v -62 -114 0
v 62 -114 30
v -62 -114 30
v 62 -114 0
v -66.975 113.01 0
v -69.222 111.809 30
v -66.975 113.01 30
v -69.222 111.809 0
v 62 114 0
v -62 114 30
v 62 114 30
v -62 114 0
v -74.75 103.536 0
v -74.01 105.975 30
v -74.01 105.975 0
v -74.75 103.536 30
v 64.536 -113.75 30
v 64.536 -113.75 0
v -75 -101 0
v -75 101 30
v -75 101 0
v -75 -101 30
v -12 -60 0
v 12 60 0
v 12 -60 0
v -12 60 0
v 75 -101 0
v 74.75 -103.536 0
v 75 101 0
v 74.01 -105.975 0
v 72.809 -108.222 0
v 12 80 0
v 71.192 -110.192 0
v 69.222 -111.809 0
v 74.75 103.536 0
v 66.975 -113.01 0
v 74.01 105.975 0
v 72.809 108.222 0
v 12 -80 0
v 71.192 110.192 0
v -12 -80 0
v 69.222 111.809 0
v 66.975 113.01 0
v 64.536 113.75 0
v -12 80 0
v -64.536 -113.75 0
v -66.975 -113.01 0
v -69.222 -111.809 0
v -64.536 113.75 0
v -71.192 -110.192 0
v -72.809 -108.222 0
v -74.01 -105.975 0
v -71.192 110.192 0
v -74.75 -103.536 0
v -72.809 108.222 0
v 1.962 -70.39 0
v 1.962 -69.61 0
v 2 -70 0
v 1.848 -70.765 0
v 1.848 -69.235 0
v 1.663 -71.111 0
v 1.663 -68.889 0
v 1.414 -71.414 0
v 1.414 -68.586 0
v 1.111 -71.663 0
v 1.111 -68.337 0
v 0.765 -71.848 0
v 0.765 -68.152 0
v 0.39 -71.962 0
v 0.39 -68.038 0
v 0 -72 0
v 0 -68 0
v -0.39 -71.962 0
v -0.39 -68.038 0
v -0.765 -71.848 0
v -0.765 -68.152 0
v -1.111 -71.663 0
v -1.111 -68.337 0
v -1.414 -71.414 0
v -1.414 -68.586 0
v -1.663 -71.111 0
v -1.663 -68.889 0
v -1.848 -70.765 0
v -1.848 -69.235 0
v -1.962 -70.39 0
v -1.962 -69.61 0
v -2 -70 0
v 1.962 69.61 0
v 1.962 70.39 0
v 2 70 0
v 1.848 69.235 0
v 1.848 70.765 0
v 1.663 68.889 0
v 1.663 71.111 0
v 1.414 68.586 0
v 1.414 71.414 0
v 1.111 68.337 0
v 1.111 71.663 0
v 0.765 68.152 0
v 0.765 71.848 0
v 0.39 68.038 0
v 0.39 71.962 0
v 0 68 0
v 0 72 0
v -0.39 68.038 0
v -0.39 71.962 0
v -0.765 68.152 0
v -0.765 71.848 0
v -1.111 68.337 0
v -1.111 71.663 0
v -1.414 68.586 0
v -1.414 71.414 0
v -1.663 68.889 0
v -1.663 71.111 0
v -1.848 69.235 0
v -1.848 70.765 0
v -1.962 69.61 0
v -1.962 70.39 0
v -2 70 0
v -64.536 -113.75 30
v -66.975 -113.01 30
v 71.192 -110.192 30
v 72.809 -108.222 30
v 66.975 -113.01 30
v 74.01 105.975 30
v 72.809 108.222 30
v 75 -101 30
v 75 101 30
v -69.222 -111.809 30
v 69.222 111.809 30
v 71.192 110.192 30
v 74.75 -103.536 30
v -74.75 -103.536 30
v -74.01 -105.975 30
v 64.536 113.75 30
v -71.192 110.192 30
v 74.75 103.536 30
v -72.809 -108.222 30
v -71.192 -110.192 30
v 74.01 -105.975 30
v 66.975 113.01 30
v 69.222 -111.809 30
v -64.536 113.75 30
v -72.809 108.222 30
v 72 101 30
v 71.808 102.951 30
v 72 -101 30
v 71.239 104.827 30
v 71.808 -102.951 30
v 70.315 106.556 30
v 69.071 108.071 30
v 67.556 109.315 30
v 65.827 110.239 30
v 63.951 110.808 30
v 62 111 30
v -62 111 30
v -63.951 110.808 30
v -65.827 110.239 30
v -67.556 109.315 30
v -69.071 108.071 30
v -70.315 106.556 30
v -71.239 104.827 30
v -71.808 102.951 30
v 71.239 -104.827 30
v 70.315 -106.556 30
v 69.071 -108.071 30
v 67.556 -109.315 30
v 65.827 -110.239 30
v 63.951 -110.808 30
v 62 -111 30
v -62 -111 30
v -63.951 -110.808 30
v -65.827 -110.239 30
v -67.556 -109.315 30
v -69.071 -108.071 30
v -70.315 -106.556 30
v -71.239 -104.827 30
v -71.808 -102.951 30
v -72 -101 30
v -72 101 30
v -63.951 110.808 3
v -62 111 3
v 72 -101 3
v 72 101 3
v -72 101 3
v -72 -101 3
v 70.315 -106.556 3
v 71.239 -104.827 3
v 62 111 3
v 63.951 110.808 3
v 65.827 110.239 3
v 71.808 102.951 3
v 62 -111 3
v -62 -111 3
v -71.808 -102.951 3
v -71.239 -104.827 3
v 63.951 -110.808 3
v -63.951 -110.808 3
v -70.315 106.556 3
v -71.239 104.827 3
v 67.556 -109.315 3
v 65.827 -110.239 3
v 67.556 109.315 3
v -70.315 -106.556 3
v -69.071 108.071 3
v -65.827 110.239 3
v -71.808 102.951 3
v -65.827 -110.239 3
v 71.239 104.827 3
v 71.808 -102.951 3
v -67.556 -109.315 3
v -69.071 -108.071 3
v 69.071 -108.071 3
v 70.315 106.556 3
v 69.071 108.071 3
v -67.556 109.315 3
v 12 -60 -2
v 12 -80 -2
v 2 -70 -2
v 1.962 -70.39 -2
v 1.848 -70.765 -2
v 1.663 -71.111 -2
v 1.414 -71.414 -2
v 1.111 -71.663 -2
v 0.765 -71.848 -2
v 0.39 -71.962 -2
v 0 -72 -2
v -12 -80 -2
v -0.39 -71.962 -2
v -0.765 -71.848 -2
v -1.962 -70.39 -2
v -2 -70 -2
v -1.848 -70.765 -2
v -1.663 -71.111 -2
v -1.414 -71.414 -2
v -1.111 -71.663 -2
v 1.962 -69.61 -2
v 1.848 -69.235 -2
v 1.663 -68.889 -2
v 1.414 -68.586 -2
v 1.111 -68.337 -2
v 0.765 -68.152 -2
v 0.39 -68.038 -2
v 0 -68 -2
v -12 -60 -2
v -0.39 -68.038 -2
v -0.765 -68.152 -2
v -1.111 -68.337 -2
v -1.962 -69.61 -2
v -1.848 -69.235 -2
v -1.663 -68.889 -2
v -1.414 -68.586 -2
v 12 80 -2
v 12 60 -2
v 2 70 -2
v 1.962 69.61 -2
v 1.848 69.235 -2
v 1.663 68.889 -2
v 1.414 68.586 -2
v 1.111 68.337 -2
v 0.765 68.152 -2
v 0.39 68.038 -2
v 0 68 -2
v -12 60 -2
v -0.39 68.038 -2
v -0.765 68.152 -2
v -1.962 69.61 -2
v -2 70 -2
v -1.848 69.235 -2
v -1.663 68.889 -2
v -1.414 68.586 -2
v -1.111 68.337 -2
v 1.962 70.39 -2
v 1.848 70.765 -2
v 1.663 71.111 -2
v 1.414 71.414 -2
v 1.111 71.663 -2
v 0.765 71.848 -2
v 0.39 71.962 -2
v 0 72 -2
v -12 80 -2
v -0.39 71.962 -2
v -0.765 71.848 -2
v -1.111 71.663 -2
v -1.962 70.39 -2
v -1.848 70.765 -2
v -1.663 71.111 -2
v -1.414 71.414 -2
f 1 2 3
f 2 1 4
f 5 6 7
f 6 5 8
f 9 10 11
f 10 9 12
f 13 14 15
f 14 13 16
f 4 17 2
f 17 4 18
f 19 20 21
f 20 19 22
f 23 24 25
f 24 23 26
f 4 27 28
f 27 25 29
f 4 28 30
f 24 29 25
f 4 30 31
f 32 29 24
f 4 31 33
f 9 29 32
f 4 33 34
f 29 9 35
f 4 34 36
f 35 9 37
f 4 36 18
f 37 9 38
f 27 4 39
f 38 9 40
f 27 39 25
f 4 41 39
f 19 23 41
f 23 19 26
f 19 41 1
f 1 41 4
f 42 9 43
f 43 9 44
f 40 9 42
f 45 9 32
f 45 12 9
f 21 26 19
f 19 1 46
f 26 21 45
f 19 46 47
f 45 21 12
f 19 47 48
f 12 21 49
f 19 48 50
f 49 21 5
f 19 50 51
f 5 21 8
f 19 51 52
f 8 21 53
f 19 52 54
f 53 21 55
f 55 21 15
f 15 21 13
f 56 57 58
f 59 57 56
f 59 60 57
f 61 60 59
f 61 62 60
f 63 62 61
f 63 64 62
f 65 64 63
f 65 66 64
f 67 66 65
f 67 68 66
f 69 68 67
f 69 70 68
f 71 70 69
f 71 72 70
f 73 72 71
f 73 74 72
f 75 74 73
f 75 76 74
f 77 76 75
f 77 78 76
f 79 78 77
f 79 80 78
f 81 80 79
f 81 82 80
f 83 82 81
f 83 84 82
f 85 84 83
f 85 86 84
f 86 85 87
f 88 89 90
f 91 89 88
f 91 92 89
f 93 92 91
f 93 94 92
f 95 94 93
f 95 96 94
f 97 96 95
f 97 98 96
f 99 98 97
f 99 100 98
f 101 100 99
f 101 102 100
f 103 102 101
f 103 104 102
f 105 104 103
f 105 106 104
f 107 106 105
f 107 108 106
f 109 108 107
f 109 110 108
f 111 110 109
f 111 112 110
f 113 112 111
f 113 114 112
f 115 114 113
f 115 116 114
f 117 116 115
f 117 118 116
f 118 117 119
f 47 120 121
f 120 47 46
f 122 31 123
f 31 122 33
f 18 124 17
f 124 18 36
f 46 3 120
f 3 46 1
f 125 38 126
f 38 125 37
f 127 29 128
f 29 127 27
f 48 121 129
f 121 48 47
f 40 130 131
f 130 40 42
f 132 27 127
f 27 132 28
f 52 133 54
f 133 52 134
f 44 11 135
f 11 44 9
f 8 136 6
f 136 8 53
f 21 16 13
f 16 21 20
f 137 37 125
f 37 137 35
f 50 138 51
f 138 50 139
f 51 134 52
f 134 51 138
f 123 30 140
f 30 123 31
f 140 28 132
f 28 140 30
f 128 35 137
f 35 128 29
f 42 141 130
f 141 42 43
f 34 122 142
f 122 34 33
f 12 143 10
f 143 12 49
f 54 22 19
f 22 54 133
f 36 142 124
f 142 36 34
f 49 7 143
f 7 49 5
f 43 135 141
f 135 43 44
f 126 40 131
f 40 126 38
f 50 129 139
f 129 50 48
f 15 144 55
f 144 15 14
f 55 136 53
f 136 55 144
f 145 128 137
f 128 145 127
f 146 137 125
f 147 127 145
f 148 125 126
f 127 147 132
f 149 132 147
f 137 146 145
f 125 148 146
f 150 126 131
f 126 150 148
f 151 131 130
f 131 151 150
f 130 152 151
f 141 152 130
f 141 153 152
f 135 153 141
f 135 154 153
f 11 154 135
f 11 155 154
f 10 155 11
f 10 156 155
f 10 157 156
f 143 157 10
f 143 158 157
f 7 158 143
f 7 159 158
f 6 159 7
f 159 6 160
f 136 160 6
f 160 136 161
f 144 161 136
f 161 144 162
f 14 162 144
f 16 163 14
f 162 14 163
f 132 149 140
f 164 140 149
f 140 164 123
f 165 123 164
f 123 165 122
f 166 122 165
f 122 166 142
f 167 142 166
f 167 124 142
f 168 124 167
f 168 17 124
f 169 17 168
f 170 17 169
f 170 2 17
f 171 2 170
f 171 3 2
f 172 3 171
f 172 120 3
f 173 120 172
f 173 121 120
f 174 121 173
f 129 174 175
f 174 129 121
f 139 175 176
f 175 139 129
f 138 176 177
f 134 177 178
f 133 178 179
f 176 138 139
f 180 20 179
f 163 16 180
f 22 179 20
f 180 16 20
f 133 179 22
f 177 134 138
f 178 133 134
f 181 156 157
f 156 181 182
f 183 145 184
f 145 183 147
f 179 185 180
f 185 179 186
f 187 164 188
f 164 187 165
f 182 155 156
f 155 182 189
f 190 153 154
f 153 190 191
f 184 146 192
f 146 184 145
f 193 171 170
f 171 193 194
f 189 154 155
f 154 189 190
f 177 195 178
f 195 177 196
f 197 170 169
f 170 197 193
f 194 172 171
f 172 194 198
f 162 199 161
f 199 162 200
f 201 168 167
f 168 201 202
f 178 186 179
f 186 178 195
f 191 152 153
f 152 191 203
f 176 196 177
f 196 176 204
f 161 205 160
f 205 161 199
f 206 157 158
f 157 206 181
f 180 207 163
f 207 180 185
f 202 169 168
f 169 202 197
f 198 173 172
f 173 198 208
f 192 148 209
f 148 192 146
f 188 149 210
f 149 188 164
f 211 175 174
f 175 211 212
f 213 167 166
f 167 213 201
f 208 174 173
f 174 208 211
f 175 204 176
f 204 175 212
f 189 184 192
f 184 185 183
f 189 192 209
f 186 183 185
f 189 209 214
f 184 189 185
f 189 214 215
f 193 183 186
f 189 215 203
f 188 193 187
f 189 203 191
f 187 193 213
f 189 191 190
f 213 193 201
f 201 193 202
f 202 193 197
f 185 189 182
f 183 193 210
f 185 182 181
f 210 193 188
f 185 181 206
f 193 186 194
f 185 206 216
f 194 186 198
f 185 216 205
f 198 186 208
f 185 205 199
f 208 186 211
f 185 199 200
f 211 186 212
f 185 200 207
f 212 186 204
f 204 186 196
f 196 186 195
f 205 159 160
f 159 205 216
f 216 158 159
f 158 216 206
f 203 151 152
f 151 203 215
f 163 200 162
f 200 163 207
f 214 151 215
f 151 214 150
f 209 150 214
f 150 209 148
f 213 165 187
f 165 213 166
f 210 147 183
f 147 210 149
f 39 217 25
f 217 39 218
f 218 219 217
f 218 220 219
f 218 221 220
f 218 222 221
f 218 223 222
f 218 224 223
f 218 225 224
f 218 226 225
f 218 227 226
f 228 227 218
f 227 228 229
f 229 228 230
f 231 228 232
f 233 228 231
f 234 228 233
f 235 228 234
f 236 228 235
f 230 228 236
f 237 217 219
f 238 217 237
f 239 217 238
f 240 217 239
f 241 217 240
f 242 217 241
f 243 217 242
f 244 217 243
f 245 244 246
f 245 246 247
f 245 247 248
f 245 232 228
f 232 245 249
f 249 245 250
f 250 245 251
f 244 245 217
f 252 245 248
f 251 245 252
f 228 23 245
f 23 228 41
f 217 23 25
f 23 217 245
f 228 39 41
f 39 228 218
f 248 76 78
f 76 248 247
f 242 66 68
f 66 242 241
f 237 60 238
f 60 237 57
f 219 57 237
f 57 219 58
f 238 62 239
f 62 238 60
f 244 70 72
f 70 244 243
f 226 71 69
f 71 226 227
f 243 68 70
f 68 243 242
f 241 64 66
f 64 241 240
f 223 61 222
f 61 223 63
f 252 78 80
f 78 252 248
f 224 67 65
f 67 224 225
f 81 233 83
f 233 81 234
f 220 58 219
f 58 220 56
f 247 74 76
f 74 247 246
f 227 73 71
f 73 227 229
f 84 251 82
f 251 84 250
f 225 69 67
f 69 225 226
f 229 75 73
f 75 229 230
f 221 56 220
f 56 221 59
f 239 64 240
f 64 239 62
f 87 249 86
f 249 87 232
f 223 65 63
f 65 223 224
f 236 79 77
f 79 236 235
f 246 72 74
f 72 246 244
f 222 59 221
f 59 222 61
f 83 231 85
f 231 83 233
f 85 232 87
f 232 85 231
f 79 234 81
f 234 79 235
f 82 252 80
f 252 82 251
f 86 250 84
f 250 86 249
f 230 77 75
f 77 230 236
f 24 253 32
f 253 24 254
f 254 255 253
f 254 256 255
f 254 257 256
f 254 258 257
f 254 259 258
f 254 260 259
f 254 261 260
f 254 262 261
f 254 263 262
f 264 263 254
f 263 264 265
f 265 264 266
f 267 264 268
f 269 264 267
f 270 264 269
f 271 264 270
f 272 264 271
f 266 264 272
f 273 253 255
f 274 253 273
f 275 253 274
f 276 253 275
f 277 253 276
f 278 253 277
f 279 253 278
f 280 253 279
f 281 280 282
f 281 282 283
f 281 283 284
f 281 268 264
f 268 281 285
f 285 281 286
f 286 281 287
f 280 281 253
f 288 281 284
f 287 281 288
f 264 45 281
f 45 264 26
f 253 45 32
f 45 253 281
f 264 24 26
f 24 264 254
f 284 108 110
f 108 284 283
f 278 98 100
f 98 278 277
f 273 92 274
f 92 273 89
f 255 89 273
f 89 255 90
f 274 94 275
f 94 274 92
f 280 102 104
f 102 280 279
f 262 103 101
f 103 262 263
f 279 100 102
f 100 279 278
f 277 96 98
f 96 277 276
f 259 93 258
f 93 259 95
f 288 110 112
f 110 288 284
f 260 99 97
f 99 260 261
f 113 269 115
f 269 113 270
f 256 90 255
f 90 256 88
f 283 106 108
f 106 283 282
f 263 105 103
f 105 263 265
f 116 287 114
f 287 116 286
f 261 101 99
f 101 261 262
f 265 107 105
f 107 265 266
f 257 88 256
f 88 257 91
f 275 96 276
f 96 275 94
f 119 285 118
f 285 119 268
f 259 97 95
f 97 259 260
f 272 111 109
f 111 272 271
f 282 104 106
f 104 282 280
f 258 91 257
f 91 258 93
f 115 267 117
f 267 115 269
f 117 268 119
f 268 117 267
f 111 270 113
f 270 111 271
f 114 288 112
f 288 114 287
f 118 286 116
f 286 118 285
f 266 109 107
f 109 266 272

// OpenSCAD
// LilRobbsGirlfriend Rev A printable prototype (mm)
part="front"; // front, rear, lid, head_front, head_back
$fn=32;
module roundrect(x,y,h,r=10){hull()for(i=[-1,1],j=[-1,1])translate([i*(x/2-r),j*(y/2-r),0])cylinder(h=h,r=r);}
module tub(){difference(){roundrect(150,228,30,13);translate([0,0,3])roundrect(144,222,31,10);}for(y=[-70,70])translate([0,y,0])difference(){cube([24,20,4],center=true);cylinder(h=8,r=2,center=true);}}
module lid(){difference(){roundrect(146,218,3,12);for(x=[-52,52],y=[-84,84])translate([x,y,-1])cylinder(h=6,r=2.2);}}
module head_half(front=true){difference(){roundrect(108,94,74,16);translate([0,0,3])roundrect(102,88,74,13);if(front)translate([0,-48,47])rotate([90,0,0])cylinder(h=14,r=11,center=true);}}
if(part=="front"||part=="rear")tub();else if(part=="lid")lid();else if(part=="head_front")intersection(){head_half(true);translate([-55,-48,-1])cube([110,48,78]);}else if(part=="head_back")intersection(){head_half(false);translate([-55,0,-1])cube([110,48,78]);}
